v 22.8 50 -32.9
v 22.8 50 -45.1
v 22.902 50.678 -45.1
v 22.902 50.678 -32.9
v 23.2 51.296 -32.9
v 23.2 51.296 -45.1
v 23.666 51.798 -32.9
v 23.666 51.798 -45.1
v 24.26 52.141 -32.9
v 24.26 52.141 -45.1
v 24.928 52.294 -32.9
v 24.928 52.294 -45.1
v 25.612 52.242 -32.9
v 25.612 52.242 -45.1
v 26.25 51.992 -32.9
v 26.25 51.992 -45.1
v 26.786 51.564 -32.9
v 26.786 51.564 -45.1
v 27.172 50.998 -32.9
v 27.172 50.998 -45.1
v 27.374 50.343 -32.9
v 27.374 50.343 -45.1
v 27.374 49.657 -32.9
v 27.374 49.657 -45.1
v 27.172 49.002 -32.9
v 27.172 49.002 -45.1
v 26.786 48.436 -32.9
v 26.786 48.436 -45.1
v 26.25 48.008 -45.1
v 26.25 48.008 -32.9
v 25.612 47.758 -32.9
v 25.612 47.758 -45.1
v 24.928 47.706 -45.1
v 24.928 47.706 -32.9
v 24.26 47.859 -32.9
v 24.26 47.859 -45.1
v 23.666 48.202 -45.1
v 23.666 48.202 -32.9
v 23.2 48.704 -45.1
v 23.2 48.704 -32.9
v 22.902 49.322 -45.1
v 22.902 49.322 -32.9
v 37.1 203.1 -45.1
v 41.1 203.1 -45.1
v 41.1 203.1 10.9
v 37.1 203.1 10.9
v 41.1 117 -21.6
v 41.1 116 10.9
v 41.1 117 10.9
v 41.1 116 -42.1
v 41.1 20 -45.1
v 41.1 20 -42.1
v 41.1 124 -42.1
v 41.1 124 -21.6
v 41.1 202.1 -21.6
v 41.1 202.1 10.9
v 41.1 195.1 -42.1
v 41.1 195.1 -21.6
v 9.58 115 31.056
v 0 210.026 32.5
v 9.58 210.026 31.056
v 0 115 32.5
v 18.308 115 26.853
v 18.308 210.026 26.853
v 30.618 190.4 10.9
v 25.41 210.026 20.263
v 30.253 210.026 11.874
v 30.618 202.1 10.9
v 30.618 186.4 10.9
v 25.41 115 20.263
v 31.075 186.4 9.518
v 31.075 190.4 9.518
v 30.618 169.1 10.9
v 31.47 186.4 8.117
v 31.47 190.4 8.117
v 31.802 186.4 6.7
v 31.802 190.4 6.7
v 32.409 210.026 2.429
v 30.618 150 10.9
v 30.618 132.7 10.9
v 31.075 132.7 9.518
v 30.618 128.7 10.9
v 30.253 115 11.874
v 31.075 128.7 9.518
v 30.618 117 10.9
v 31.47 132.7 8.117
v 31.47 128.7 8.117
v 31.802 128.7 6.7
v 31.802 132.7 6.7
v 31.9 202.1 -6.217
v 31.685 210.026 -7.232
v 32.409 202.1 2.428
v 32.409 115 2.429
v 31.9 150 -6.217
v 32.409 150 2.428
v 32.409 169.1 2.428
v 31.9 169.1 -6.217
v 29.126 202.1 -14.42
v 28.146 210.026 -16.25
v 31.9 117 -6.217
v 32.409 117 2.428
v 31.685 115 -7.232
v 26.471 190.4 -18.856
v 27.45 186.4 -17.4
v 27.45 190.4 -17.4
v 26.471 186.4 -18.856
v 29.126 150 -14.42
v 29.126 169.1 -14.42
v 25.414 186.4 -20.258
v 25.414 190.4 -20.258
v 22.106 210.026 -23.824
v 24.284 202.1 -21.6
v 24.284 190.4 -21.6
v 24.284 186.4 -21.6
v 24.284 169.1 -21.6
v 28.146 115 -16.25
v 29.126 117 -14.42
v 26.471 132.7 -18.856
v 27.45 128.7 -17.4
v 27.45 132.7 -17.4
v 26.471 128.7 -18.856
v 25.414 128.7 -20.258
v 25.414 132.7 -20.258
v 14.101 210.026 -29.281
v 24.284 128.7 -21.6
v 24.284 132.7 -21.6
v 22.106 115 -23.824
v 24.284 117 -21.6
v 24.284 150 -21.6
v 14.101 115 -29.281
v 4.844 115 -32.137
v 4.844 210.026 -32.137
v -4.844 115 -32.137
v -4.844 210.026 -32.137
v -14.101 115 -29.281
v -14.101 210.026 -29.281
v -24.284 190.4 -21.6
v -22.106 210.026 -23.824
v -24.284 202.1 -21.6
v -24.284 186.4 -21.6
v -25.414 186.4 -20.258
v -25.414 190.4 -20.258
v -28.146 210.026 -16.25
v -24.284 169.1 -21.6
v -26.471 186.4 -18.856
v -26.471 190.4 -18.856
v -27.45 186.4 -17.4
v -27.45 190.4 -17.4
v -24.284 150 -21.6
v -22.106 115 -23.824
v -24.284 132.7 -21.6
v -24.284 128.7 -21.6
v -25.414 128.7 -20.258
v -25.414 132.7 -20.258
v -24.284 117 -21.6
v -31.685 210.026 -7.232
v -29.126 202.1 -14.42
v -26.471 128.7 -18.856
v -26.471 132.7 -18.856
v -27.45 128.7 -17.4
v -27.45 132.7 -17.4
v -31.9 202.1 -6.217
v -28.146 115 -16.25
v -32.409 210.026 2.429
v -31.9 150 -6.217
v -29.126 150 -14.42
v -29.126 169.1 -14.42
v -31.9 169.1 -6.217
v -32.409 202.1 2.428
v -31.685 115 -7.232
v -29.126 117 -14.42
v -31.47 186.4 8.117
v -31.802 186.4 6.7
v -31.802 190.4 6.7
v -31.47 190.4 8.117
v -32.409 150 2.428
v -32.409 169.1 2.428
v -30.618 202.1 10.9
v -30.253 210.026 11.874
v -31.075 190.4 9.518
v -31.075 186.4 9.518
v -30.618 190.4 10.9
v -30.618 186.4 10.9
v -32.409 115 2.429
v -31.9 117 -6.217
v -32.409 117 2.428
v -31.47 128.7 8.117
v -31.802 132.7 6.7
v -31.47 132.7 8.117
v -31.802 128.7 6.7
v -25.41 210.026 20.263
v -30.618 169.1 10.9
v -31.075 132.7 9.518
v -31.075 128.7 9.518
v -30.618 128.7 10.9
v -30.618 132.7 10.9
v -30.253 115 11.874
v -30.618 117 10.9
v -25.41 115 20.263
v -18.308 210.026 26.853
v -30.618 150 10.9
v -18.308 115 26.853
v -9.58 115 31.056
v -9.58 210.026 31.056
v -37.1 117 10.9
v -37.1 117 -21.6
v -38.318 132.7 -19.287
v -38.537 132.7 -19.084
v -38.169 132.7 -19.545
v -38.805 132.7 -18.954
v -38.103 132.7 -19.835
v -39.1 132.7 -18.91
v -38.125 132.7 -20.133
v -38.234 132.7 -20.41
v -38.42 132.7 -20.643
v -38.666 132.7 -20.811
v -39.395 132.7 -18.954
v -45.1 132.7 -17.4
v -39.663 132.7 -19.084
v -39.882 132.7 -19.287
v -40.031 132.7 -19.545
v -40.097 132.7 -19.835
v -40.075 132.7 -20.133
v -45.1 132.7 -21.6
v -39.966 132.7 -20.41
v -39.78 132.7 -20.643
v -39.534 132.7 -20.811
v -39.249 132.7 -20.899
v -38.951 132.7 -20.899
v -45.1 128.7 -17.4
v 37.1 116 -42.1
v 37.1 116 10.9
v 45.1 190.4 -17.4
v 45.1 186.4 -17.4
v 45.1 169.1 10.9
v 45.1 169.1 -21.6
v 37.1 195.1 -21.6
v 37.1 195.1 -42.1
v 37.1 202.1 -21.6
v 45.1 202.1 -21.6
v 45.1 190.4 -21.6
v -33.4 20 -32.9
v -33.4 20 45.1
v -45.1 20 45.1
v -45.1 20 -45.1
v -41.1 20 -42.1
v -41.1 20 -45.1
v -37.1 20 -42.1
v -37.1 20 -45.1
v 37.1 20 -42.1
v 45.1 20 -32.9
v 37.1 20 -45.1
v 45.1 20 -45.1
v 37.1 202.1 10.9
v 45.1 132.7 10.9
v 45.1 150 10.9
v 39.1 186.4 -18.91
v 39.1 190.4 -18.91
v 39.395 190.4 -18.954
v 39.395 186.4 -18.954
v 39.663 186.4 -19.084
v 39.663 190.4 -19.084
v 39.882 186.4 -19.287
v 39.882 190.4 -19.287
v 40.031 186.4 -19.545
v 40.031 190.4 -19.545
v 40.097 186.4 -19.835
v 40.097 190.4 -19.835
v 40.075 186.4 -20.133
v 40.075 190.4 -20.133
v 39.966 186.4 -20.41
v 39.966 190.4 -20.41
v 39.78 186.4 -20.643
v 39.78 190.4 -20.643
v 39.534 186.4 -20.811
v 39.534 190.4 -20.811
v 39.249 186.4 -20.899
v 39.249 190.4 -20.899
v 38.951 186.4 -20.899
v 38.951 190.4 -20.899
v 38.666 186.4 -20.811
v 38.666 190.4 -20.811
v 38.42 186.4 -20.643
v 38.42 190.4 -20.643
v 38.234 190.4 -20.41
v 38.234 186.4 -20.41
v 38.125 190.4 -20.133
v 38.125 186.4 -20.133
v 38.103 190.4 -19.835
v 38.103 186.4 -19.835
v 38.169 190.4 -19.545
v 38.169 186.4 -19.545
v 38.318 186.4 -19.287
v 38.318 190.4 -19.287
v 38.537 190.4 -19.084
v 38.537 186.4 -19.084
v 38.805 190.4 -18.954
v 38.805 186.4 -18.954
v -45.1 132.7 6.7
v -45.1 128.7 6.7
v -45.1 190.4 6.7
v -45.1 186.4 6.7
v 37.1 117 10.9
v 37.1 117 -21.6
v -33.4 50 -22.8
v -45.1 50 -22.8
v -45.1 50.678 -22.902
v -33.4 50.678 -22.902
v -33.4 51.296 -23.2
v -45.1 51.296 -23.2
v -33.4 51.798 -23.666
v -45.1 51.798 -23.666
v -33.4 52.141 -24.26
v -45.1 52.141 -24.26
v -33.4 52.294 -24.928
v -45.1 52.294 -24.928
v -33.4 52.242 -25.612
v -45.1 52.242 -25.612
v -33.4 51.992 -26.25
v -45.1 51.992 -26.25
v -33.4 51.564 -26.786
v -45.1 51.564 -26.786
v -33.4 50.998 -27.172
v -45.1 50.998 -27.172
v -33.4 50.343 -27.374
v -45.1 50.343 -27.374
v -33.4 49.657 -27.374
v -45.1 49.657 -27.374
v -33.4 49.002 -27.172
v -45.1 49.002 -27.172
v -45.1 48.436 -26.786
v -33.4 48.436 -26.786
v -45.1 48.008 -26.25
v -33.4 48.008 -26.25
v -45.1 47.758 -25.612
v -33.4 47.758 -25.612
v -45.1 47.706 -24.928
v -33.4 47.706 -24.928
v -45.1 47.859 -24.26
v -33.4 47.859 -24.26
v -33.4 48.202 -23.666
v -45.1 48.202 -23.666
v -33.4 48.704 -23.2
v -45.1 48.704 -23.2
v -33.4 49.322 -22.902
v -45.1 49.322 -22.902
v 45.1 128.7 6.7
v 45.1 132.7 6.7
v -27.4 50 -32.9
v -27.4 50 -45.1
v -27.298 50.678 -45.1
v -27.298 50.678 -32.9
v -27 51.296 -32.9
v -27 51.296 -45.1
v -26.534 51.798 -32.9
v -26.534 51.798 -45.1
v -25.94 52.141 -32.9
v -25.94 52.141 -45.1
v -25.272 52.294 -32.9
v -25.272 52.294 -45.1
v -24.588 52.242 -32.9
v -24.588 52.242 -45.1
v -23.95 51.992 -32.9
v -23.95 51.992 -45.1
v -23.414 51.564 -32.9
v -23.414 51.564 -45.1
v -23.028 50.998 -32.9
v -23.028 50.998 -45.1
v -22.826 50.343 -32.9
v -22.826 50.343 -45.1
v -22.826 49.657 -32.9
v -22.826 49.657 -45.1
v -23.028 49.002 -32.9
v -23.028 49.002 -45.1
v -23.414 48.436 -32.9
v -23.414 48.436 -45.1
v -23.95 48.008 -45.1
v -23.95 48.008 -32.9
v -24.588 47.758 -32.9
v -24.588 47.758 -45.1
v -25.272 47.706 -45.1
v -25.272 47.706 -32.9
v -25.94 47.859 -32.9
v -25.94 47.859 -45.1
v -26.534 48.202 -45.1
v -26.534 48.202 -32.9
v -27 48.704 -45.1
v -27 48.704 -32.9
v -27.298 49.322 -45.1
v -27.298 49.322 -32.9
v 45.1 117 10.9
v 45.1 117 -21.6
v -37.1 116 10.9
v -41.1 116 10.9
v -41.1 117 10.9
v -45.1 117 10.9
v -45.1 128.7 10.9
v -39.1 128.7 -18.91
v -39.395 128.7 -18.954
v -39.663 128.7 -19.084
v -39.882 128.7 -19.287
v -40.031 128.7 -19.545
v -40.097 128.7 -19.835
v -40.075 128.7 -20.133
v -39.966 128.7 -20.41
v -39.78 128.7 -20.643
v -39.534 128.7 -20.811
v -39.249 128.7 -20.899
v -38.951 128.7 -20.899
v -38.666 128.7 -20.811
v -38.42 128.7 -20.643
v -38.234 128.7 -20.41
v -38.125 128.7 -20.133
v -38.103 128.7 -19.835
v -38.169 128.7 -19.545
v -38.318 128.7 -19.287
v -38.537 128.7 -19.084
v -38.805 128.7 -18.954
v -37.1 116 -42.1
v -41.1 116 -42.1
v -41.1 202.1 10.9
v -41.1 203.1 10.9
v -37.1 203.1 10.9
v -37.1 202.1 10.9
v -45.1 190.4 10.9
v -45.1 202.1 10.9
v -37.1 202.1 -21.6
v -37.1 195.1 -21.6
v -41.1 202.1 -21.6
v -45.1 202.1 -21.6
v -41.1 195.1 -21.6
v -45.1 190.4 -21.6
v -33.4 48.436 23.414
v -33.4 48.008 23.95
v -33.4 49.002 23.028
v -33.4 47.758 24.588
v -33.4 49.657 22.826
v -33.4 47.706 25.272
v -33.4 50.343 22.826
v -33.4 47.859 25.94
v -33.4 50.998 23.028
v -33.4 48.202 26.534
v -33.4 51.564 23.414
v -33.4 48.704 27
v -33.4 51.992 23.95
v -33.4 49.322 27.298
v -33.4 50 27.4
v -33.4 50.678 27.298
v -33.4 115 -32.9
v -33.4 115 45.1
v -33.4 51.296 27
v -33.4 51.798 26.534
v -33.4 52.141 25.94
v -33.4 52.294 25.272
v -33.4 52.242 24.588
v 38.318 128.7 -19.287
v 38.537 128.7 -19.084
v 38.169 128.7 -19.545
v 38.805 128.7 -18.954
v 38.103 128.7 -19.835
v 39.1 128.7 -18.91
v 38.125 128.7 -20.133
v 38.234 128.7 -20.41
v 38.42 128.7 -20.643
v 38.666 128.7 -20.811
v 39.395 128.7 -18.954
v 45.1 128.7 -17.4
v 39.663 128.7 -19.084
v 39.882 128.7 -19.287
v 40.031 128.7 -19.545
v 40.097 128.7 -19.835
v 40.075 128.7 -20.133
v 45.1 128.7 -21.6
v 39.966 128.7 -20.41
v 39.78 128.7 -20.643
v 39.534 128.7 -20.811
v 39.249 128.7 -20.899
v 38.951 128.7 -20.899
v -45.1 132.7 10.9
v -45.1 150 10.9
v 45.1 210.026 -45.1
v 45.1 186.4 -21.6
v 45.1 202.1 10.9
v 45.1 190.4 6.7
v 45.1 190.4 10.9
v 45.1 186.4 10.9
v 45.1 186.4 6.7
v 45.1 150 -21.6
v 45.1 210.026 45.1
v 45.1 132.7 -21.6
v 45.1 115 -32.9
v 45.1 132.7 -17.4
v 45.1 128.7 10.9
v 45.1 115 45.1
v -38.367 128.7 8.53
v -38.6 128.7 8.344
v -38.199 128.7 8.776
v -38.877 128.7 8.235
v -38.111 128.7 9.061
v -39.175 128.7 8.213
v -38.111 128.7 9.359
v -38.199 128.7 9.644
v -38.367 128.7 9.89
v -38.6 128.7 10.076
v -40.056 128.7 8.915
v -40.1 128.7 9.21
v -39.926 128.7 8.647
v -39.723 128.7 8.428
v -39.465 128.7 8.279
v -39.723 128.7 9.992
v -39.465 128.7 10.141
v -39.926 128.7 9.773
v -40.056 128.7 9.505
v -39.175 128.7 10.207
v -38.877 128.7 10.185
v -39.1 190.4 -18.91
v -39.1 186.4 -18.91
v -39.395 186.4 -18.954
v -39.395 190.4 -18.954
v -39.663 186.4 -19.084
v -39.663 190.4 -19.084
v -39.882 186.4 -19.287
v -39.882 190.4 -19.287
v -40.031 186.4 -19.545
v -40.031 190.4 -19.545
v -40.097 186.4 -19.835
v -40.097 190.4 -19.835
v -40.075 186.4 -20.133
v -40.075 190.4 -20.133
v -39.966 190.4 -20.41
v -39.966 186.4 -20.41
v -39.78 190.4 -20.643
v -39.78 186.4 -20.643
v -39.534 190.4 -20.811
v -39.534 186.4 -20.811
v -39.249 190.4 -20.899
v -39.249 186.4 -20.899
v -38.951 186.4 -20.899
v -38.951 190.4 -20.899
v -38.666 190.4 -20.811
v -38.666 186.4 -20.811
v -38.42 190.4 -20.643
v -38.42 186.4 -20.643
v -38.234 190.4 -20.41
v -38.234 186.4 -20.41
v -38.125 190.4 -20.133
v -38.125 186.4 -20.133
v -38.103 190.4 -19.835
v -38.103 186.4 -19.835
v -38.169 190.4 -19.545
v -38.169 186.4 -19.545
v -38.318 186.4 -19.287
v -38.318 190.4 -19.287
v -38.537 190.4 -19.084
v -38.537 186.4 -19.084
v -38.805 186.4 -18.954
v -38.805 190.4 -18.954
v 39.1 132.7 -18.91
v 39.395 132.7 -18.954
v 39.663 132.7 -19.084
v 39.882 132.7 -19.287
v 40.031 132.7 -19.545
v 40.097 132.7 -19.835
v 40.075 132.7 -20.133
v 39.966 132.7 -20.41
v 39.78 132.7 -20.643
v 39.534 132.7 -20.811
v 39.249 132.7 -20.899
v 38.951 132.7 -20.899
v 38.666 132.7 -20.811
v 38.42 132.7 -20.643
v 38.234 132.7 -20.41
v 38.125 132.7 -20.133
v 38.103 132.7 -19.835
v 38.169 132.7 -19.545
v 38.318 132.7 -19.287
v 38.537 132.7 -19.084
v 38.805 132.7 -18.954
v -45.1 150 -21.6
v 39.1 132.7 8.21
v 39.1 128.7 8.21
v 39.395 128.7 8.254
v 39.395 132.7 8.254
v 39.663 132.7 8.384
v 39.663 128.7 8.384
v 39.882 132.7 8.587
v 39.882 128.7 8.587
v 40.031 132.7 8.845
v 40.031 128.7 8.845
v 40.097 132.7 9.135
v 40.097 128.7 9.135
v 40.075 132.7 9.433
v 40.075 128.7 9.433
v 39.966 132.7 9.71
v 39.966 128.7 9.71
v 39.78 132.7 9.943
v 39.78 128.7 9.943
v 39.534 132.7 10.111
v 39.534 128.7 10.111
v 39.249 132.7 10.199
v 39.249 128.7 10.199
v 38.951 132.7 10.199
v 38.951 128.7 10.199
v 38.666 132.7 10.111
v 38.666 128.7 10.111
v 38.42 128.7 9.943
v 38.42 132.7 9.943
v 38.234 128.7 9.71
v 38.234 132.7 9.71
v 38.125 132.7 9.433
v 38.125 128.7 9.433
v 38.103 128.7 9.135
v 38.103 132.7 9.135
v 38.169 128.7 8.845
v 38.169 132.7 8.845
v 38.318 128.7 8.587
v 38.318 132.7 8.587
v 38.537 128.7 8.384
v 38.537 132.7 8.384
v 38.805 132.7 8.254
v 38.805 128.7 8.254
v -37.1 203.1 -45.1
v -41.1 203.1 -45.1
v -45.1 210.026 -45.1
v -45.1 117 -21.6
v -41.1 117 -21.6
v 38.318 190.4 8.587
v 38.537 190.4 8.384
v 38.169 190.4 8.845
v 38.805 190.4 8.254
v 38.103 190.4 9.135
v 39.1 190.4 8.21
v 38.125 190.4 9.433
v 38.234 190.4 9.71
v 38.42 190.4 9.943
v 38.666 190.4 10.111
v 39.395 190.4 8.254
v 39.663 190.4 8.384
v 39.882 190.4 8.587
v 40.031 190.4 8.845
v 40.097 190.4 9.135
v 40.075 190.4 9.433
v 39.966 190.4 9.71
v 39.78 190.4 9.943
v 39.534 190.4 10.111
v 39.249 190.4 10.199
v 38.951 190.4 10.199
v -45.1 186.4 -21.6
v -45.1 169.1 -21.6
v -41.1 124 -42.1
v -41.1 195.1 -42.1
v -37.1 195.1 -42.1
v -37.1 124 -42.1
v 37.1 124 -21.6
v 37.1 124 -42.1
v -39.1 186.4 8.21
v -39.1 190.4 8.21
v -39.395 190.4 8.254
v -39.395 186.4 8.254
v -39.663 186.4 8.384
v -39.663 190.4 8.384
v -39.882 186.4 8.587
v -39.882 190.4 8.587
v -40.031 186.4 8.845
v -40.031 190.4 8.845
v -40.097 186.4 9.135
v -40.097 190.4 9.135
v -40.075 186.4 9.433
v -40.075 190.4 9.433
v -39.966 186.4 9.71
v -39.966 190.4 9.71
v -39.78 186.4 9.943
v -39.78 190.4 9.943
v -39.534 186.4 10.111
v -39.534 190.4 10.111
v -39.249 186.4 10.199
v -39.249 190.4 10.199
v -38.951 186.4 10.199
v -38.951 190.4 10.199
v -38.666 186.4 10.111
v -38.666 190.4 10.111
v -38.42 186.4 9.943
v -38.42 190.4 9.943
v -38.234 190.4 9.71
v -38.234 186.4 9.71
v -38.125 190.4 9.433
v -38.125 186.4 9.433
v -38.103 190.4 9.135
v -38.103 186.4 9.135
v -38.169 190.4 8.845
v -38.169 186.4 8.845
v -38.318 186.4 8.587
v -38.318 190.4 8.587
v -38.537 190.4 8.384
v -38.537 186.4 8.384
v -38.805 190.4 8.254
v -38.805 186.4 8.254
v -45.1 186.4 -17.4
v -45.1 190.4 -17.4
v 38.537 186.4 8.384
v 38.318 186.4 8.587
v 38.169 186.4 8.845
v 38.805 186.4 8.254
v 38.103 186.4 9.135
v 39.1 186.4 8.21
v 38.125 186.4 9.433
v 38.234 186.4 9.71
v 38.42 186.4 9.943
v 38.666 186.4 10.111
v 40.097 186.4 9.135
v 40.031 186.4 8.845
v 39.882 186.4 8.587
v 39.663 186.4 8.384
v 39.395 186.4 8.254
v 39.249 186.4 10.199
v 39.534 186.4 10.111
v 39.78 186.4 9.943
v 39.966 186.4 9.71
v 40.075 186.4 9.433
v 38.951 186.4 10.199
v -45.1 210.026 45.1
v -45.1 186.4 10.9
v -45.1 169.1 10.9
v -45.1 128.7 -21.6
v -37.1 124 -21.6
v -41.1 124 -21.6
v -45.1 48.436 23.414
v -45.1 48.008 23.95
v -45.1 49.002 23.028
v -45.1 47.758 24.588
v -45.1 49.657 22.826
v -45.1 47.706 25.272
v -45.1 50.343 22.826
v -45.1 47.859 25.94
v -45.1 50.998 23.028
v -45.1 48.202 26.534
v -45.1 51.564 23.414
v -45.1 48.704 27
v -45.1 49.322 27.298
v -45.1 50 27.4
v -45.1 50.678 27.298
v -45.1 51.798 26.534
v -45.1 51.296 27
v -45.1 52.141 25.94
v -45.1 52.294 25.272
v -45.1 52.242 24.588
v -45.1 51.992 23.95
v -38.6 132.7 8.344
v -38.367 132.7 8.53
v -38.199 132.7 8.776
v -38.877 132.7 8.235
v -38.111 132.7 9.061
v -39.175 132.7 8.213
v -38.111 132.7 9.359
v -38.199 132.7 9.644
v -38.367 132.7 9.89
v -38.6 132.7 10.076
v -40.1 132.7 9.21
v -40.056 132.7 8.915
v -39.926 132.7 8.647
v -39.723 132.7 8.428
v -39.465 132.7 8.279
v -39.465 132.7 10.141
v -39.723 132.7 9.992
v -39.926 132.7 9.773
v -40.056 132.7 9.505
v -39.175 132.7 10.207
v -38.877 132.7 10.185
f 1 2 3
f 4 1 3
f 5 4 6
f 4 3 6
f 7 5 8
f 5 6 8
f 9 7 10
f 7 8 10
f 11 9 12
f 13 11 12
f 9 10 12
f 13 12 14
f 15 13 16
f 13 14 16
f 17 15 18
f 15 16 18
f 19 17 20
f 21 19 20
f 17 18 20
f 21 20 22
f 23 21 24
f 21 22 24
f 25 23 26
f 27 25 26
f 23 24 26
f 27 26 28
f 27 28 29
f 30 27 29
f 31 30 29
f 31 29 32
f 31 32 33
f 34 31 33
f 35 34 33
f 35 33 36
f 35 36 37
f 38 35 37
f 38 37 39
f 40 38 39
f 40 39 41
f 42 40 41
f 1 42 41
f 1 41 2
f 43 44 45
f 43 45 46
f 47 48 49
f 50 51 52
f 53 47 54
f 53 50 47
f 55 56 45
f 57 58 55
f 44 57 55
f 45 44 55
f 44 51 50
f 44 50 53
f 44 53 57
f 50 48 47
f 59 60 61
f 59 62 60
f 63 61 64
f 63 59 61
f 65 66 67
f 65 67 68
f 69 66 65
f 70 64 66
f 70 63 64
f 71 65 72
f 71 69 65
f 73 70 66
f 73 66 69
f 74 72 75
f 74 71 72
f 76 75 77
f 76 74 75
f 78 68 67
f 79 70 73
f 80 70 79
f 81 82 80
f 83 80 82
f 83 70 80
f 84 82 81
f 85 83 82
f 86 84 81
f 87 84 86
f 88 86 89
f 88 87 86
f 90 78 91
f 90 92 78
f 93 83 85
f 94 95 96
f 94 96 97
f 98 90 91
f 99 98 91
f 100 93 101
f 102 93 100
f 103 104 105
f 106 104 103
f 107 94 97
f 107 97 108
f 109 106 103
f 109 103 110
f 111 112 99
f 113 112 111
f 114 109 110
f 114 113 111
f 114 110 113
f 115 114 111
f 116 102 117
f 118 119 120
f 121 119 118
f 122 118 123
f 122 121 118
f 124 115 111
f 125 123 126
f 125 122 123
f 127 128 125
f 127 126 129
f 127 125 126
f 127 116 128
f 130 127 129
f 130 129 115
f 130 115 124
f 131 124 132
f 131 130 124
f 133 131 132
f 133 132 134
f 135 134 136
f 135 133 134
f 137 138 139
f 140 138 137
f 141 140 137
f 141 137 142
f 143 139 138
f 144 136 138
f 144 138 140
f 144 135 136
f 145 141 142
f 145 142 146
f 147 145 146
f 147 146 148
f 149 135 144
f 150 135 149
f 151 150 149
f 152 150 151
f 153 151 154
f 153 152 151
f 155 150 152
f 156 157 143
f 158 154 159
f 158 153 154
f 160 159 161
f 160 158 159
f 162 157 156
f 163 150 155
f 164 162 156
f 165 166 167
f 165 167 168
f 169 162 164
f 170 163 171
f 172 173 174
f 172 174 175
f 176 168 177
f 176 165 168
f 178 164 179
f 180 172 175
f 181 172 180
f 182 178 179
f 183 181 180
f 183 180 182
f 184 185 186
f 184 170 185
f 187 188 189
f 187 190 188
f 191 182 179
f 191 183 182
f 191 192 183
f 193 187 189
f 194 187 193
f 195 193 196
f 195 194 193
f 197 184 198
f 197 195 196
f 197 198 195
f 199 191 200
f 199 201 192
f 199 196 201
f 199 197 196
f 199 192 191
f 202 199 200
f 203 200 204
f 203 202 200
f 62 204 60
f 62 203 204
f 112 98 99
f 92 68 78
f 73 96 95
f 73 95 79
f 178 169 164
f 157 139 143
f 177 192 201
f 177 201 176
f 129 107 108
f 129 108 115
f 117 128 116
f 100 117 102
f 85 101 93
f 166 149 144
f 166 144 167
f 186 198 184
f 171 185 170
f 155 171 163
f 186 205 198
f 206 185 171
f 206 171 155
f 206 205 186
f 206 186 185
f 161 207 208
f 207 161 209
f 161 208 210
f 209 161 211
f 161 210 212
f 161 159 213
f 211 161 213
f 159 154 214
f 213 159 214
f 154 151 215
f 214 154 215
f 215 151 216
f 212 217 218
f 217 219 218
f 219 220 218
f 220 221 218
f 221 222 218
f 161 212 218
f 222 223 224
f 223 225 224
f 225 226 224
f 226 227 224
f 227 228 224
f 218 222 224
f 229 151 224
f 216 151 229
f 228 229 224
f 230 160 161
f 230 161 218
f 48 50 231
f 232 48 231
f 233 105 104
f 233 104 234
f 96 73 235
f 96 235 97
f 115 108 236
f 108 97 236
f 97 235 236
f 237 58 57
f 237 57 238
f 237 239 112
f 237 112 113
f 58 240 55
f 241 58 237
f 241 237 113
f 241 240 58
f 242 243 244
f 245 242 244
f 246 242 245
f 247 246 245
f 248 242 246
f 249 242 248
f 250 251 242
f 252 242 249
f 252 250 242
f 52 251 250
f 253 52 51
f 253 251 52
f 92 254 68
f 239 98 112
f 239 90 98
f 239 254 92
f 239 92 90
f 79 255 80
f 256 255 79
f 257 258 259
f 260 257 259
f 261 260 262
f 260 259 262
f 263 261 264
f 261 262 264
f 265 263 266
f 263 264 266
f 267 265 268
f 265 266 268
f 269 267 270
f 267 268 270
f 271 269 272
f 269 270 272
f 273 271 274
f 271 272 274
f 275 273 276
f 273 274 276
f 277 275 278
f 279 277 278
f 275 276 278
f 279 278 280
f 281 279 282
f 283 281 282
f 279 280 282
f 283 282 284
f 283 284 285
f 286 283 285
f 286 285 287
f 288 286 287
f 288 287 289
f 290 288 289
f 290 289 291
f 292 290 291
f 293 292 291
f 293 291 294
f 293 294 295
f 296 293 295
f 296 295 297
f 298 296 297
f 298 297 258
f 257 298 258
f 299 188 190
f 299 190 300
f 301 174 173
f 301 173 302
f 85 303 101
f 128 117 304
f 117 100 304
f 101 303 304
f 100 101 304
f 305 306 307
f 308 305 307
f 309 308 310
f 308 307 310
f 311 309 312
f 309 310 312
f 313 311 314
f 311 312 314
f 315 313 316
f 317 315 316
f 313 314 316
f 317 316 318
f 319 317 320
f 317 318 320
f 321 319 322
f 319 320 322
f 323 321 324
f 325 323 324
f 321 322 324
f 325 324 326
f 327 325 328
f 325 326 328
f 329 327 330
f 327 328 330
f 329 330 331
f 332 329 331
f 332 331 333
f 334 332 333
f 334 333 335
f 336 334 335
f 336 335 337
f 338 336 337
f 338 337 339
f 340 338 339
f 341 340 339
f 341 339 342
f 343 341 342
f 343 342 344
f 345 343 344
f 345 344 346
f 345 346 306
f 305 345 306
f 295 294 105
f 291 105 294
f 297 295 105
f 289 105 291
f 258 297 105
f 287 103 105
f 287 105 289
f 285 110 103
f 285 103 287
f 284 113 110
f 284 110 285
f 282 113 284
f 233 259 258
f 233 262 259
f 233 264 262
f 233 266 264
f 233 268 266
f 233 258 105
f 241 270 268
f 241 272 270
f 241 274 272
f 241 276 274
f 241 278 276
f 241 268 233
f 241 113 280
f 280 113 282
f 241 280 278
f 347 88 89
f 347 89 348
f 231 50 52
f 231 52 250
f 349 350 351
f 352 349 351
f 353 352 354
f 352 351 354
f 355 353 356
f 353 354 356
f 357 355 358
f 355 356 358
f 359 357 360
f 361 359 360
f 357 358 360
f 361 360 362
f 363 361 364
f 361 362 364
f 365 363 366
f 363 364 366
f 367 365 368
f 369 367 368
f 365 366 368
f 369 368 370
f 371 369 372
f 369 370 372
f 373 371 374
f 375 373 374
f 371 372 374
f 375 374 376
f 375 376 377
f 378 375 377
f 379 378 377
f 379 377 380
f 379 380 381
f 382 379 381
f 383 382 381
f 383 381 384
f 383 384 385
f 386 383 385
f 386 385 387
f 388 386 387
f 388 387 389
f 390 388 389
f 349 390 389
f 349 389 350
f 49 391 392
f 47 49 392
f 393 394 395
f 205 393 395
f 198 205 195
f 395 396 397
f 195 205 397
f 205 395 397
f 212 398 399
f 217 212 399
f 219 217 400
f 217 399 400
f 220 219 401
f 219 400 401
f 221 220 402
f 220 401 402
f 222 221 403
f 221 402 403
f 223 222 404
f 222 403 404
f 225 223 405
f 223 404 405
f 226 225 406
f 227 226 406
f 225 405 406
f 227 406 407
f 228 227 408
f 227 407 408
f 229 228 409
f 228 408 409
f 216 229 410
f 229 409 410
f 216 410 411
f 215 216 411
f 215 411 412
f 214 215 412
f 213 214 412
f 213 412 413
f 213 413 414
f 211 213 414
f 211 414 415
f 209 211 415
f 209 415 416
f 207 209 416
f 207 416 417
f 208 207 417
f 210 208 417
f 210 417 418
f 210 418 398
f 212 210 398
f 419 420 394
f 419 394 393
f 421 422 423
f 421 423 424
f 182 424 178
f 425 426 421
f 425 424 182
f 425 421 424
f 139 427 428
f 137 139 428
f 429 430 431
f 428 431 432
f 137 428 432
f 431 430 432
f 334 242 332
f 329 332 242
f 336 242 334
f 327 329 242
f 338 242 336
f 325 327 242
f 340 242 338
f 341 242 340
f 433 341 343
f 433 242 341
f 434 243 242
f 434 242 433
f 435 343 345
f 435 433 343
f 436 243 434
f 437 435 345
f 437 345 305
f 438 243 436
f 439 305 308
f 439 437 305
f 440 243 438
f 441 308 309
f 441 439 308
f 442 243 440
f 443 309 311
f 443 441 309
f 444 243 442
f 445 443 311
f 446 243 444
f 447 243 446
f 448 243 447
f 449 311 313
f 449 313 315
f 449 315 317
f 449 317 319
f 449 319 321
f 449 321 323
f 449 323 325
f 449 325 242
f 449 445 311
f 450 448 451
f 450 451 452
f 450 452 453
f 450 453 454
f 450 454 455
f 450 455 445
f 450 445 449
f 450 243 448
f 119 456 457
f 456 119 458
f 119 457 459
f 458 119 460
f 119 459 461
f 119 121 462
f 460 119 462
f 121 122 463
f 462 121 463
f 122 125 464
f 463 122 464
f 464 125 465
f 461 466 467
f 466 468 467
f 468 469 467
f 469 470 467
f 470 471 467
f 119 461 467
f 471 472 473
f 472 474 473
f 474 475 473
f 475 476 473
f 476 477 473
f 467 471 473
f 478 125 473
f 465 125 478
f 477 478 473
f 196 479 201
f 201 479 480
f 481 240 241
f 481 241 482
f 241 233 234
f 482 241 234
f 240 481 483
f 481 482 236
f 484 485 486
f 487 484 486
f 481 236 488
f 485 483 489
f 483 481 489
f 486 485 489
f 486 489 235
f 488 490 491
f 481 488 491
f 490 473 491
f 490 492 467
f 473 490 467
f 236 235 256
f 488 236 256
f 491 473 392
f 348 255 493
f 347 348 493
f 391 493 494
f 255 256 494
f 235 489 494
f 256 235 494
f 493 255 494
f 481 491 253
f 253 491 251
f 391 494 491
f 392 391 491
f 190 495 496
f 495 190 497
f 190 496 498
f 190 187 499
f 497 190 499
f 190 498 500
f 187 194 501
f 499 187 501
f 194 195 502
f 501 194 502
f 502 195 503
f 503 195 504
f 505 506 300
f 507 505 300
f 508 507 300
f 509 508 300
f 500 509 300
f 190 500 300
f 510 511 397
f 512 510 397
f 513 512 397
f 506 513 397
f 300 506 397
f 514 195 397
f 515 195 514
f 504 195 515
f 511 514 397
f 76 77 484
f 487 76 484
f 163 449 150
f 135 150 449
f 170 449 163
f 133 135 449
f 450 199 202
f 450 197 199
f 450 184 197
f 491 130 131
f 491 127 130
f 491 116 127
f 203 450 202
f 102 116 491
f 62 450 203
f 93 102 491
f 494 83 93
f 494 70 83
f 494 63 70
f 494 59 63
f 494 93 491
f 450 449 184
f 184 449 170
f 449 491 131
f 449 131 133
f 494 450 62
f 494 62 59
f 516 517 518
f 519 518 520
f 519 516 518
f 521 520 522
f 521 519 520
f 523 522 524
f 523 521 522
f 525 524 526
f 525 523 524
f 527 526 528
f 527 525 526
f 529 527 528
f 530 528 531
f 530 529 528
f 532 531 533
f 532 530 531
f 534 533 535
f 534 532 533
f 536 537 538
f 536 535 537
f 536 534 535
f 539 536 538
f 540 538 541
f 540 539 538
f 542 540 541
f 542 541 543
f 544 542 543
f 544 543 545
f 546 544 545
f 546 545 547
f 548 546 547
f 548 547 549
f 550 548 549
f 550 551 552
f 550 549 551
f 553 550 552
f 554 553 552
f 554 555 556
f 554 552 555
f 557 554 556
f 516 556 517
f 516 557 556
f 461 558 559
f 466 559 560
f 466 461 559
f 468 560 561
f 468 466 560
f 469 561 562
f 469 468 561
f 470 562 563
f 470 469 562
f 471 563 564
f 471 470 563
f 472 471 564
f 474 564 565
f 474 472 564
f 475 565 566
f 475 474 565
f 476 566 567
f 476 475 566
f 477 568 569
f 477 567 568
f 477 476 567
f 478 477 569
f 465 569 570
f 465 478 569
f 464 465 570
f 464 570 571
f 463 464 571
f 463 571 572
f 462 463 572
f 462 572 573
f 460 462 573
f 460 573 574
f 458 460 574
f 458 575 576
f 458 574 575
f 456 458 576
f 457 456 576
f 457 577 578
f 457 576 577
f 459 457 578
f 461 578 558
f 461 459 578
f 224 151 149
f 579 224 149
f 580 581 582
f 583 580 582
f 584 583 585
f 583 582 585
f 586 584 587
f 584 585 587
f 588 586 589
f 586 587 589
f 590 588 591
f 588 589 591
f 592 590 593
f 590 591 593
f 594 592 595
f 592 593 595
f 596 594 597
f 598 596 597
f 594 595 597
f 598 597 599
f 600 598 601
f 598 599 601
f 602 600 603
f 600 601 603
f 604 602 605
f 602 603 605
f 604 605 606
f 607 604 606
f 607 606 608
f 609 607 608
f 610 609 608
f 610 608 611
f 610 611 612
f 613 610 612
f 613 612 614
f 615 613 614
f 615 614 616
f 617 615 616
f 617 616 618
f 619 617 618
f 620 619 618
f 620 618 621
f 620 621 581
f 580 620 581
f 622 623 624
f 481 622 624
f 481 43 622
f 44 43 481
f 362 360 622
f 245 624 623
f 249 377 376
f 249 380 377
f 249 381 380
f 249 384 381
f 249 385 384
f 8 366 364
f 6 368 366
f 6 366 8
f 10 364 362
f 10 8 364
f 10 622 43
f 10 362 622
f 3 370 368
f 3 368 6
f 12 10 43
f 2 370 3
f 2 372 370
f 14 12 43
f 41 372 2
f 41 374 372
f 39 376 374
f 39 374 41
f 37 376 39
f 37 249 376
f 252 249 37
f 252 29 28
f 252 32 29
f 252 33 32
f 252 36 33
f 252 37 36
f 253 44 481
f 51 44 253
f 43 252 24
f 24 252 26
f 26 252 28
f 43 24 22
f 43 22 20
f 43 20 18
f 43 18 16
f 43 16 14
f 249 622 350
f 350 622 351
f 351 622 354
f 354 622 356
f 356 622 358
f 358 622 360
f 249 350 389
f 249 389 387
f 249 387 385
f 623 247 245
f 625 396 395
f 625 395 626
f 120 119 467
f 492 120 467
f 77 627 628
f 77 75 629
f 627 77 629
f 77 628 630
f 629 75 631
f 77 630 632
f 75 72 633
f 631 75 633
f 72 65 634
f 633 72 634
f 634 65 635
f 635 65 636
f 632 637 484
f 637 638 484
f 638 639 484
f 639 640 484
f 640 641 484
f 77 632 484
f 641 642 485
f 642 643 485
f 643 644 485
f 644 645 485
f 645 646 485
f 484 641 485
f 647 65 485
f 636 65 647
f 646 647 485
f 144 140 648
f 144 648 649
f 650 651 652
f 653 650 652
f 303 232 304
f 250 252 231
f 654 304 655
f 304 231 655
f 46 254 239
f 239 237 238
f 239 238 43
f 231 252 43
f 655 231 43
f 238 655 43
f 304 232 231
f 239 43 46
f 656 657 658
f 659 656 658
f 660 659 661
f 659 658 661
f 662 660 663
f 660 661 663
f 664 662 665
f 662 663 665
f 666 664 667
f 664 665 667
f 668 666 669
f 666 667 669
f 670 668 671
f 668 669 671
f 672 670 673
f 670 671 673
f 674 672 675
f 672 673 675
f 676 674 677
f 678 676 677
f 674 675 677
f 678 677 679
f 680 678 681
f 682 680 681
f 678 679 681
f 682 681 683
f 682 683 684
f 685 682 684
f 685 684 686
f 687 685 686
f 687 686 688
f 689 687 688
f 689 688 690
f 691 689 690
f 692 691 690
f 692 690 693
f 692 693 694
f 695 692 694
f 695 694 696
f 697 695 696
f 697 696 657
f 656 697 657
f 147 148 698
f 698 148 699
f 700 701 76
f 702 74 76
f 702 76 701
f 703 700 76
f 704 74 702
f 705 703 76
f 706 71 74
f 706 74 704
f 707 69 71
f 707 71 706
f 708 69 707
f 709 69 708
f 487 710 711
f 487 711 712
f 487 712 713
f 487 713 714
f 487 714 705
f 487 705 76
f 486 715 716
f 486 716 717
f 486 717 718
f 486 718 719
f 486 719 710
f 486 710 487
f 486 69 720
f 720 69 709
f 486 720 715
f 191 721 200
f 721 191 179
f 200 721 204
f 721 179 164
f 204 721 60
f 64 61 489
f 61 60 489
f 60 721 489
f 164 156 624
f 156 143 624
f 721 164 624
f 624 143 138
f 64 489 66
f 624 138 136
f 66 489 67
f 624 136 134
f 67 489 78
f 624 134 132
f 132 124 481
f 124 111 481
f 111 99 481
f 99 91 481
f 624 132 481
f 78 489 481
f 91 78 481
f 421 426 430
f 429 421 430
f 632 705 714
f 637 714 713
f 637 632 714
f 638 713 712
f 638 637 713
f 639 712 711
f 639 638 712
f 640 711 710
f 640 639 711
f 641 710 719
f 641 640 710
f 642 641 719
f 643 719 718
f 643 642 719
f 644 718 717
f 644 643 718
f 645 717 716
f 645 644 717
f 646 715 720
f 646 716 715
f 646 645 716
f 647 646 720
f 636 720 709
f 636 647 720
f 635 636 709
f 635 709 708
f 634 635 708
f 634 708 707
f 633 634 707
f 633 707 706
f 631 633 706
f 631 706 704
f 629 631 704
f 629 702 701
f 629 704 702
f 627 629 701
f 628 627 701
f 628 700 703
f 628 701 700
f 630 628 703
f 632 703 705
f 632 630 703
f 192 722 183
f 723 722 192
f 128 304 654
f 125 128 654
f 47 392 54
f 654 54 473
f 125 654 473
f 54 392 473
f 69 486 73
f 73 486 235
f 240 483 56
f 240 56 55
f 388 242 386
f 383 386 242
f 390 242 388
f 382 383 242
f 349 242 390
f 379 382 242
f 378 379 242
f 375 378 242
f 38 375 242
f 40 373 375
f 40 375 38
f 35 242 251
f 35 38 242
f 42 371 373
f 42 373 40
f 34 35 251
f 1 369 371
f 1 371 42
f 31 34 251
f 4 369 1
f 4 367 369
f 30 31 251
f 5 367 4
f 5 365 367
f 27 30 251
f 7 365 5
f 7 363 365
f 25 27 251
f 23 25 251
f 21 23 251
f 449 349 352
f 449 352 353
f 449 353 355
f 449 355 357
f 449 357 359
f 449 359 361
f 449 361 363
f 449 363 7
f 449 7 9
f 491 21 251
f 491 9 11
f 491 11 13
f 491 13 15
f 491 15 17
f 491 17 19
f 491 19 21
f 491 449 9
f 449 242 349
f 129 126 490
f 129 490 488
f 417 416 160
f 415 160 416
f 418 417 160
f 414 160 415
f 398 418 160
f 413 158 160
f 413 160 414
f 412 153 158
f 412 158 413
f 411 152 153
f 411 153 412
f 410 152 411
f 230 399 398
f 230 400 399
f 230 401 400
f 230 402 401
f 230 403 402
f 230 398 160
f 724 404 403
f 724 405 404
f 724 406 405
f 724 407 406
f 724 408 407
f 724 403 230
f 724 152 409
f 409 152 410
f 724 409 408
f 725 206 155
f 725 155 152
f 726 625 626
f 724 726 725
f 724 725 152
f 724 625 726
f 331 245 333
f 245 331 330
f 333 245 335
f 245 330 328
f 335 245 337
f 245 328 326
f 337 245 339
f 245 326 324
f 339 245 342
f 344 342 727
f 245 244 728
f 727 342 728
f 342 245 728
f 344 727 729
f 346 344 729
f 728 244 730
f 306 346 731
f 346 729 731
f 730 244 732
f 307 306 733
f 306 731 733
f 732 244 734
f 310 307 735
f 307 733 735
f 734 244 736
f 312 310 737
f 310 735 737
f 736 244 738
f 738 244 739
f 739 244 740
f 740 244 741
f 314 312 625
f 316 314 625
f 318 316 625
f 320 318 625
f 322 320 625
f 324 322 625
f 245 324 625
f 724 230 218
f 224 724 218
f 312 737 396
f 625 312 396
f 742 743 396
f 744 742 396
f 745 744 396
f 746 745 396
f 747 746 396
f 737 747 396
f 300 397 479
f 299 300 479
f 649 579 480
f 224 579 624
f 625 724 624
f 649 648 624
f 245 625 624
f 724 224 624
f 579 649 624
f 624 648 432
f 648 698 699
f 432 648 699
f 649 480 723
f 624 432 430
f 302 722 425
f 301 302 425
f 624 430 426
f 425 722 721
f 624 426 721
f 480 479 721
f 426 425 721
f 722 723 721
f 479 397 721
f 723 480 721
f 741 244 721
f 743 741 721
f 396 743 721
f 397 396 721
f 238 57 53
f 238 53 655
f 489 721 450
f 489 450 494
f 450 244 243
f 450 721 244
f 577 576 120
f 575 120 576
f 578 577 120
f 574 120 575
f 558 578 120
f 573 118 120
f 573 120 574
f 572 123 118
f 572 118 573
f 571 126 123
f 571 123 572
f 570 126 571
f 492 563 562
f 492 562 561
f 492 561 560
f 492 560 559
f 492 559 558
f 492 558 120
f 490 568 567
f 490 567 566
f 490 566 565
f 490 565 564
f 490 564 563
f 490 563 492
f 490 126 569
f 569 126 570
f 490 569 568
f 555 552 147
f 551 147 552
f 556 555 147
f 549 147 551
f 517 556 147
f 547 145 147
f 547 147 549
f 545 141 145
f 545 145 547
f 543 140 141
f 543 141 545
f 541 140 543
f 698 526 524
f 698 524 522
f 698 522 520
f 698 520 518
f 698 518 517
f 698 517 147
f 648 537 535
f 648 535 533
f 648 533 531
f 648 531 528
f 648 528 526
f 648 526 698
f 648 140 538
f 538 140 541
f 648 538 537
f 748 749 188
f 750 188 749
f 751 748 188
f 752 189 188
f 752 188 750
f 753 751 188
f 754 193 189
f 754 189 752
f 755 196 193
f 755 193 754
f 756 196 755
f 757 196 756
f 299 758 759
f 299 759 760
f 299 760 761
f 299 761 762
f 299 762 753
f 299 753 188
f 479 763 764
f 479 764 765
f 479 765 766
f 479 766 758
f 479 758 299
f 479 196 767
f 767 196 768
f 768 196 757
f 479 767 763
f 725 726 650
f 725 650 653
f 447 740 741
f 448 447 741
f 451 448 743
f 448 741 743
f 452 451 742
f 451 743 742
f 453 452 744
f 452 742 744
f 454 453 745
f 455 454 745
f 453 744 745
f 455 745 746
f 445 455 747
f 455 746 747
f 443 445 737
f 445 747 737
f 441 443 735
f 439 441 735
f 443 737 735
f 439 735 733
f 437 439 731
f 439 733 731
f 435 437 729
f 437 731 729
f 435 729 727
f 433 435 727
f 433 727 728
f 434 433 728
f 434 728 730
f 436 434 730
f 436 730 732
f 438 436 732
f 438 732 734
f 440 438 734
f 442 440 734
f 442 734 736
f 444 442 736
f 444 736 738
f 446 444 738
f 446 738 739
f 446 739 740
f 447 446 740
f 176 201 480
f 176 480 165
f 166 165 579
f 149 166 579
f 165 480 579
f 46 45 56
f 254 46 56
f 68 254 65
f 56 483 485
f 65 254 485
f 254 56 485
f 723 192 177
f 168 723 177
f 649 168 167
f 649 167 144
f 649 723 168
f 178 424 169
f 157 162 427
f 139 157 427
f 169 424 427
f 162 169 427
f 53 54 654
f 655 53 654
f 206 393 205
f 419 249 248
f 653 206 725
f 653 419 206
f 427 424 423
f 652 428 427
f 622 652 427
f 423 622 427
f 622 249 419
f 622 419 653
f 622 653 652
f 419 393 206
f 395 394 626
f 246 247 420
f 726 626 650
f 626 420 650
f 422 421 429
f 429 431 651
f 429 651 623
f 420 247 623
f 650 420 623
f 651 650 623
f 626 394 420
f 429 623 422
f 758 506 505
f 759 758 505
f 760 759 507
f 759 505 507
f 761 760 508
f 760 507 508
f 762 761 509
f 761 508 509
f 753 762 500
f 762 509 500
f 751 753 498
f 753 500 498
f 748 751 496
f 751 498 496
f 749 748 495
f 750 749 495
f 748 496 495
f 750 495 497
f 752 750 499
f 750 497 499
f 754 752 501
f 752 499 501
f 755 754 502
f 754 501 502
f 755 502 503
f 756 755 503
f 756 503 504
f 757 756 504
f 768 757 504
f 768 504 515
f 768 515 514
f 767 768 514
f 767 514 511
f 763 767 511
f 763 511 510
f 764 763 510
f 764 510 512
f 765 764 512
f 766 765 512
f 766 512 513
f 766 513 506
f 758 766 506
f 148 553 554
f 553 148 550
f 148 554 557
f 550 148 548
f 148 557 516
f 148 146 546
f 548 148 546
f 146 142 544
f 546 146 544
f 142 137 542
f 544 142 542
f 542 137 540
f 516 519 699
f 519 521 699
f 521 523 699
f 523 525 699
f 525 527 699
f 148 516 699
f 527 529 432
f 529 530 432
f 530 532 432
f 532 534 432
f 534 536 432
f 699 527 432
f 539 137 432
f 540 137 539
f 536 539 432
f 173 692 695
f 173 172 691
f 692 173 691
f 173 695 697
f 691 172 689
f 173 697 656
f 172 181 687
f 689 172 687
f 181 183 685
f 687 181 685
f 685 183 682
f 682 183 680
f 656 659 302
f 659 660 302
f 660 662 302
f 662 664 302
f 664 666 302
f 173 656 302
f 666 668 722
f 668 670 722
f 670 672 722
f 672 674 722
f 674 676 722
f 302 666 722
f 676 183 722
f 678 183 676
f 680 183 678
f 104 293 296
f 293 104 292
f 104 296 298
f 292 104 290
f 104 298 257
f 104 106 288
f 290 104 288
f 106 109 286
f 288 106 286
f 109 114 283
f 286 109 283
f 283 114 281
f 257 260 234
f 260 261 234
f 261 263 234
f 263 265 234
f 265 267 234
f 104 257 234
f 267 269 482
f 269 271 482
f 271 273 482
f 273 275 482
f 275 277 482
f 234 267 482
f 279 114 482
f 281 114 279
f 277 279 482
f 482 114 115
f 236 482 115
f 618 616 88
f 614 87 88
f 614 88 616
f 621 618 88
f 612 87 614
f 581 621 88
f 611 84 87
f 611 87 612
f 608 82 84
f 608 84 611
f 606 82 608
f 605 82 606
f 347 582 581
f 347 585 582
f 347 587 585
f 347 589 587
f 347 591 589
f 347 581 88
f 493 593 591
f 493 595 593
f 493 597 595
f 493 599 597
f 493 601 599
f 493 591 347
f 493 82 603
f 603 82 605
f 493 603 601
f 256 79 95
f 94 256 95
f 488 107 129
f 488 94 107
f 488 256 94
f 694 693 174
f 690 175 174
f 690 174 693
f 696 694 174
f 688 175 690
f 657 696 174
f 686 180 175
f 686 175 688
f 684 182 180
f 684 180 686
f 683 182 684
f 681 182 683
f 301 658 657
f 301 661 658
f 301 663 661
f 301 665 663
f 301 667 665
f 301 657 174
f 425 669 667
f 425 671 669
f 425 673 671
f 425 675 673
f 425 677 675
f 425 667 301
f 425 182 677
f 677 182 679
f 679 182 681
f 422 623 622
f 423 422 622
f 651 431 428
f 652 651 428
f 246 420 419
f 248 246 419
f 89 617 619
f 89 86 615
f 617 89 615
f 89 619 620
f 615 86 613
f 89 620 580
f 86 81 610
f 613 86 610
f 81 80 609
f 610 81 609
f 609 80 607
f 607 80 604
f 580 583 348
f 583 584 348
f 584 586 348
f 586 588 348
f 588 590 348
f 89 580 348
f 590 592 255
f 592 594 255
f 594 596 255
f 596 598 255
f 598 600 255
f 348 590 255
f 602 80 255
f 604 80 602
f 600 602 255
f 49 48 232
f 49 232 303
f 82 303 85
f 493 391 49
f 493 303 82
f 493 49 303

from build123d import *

# Parameters (mm, degrees)
SKETCH2_W                      = 90.2
SKETCH2_H                      = 90.2
SKETCH2_R                      = 32.5
BOSS_EXTRUDE2_DEPTH            = 250
SKETCH3_W                      = 78.5
SKETCH3_H                      = 115
CUT_EXTRUDE1_DEPTH             = 78
SKETCH6_W                      = 32.5
SKETCH6_H                      = 33
CUT_EXTRUDE4_DEPTH             = 32.6
MIRROR3_COPY_1_SKETCH_W        = 32.5
MIRROR3_COPY_1_SKETCH_H        = 33
MIRROR3_COPY_1_DEPTH           = 32.6
MIRROR3_COPY_2_SKETCH_W        = 32.5
MIRROR3_COPY_2_SKETCH_H        = 33
MIRROR3_COPY_2_DEPTH           = 32.6
CUT_EXTRUDE5_REACH             = 271.574
SKETCH10_W                     = 4
SKETCH10_H                     = 8
CUT_EXTRUDE5_DIRECTION_2_DEPTH = 270.573830332
SKETCH11_W                     = 4
SKETCH11_H                     = 200
CUT_EXTRUDE6_DEPTH             = 3
MIRROR7_COPY_1_REACH           = 271.574
MIRROR7_COPY_1_SKETCH_W        = 4
MIRROR7_COPY_1_SKETCH_H        = 8
MIRROR7_COPY_2_SKETCH_W        = 4
MIRROR7_COPY_2_SKETCH_H        = 8
MIRROR7_COPY_2_DEPTH           = 270.573830332
MIRROR7_COPY_3_REACH           = 271.574
MIRROR7_COPY_3_SKETCH_W        = 4
MIRROR7_COPY_3_SKETCH_H        = 8
MIRROR7_COPY_4_SKETCH_W        = 4
MIRROR7_COPY_4_SKETCH_H        = 8
MIRROR7_COPY_4_DEPTH           = 270.573830332
SKETCH12_W                     = 20.816466484
SKETCH12_H                     = 4
BOSS_EXTRUDE3_DEPTH            = 4.2
SKETCH13_R                     = 1
CUT_EXTRUDE7_DEPTH             = 10
MIRROR9_COPY_1_SKETCH_W        = 20.816466484
MIRROR9_COPY_1_SKETCH_H        = 4
MIRROR9_COPY_1_DEPTH           = 4.2
MIRROR9_COPY_2_SKETCH_R        = 1
MIRROR9_COPY_2_DEPTH           = 10
MIRROR10_COPY_1_SKETCH_W       = 20.816466484
MIRROR10_COPY_1_SKETCH_H       = 4
MIRROR10_COPY_1_DEPTH          = 4.2
MIRROR10_COPY_2_SKETCH_R       = 1
MIRROR10_COPY_2_DEPTH          = 10
MIRROR10_COPY_3_SKETCH_W       = 20.816466484
MIRROR10_COPY_3_SKETCH_H       = 4
MIRROR10_COPY_3_DEPTH          = 4.2
MIRROR10_COPY_4_SKETCH_R       = 1
MIRROR10_COPY_4_DEPTH          = 10
MIRROR10_COPY_5_SKETCH_W       = 20.816466484
MIRROR10_COPY_5_SKETCH_H       = 4
MIRROR10_COPY_5_DEPTH          = 4.2
MIRROR10_COPY_6_SKETCH_R       = 1
MIRROR10_COPY_6_DEPTH          = 10
CUT_EXTRUDE8_START             = -1000
SKETCH14_R                     = 32.5
CUT_EXTRUDE8_DEPTH             = 1000
SKETCH15_W                     = 90.2
SKETCH15_H                     = 39.974184268
CUT_EXTRUDE9_DEPTH             = 270.573830332
SKETCH16_W                     = 90.2
SKETCH16_H                     = 20
CUT_EXTRUDE10_DEPTH            = 233.982602942
SKETCH19_R                     = 2.3
CUT_EXTRUDE11_DEPTH            = 233.982602942
CIRPATTERN1_COUNT              = 2
CIRPATTERN1_ANGLE              = 90


with BuildPart() as part:
    # Sketch2 → Boss-Extrude2 (new body)
    with BuildSketch(Plane(origin=(0, 0, 0), x_dir=(1, 0, 0), z_dir=(0, 1, 0))):
        Rectangle(SKETCH2_W, SKETCH2_H)
        with Locations(Location((0, 0, 0), (0, 0, 270))):
            Circle(SKETCH2_R, mode=Mode.SUBTRACT)
    extrude(amount=BOSS_EXTRUDE2_DEPTH)

    # Sketch3 → Cut-Extrude1 (cut)
    with BuildSketch(Plane.XY.offset(45.1)):
        with Locations((5.85, 57.5)):
            Rectangle(SKETCH3_W, SKETCH3_H)
    extrude(amount=-CUT_EXTRUDE1_DEPTH, mode=Mode.SUBTRACT)

    # Sketch6 → Cut-Extrude4 (cut)
    with BuildSketch(Plane(origin=(45.1, 0, 0), x_dir=(0, 0, -1), z_dir=(1, 0, 0))):
        with Locations((5.35, 133.5)):
            Rectangle(SKETCH6_W, SKETCH6_H)
    cut_extrude4 = extrude(amount=-CUT_EXTRUDE4_DEPTH, mode=Mode.SUBTRACT)

    # Mirror1: Cut-Extrude4 across plane
    add(cut_extrude4.mirror(Plane(origin=(0, 0, 0), x_dir=(0, 0, 1), z_dir=(1, 0, 0))), mode=Mode.SUBTRACT)

    # Mirror2: Cut-Extrude4 across plane
    add(cut_extrude4.mirror(Plane(origin=(0, 159.55, 0), x_dir=(0, 0, 1), z_dir=(0, -1, 0))), mode=Mode.SUBTRACT)

    # Mirror3 copy 1 sketch → Mirror3 copy 1 (cut)
    with BuildSketch(Plane(origin=(-45.1, 319.1, 0), x_dir=(0, 0, -1), z_dir=(-1, 0, 0))):
        with Locations((5.35, 133.5)):
            Rectangle(MIRROR3_COPY_1_SKETCH_W, MIRROR3_COPY_1_SKETCH_H)
    extrude(amount=-MIRROR3_COPY_1_DEPTH, mode=Mode.SUBTRACT)

    # Mirror3 copy 2 sketch → Mirror3 copy 2 (cut)
    with BuildSketch(Plane(origin=(-45.1, 0, 0), x_dir=(0, 0, -1), z_dir=(-1, 0, 0))):
        with Locations((5.35, -133.5)):
            Rectangle(MIRROR3_COPY_2_SKETCH_W, MIRROR3_COPY_2_SKETCH_H)
    extrude(amount=-MIRROR3_COPY_2_DEPTH, mode=Mode.SUBTRACT)

    # Cut-Extrude5: up to this face of the body (flat: up to its plane)
    cut_extrude5_end = Plane(part.part.faces().sort_by_distance((37.858820987, 185.6, 10.9))[0])
    # Sketch10 → Cut-Extrude5 (cut, up to the picked face)
    with BuildSketch(Plane(origin=(0, 0, -45.1), x_dir=(-1, 0, 0), z_dir=(0, 0, -1)), mode=Mode.PRIVATE) as cut_extrude5_sk1:
        with Locations((-39.1, 199.1)):
            Rectangle(SKETCH10_W, SKETCH10_H)
    cut_extrude5_tool1 = split(extrude(cut_extrude5_sk1.sketch, amount=-CUT_EXTRUDE5_REACH, mode=Mode.PRIVATE), bisect_by=cut_extrude5_end, keep=Keep.BOTH, mode=Mode.PRIVATE)
    cut_extrude5 = cut_extrude5_tool1.solids().sort_by(Axis((39.1, 199.1, -45.1), (0, 0, 1)))[0]
    add(cut_extrude5, mode=Mode.SUBTRACT)

    # Sketch10 → Cut-Extrude5 direction 2 (cut)
    with BuildSketch(Plane(origin=(0, 0, -45.1), x_dir=(-1, 0, 0), z_dir=(0, 0, -1))):
        with Locations((-39.1, 199.1)):
            Rectangle(SKETCH10_W, SKETCH10_H)
    cut_extrude5_direction_2 = extrude(amount=CUT_EXTRUDE5_DIRECTION_2_DEPTH, mode=Mode.SUBTRACT)

    # Sketch11 → Cut-Extrude6 (cut)
    with BuildSketch(Plane(origin=(0, 0, -45.1), x_dir=(-1, 0, 0), z_dir=(0, 0, -1))):
        with Locations((-39.1, 95.1)):
            Rectangle(SKETCH11_W, SKETCH11_H)
    cut_extrude6 = extrude(amount=-CUT_EXTRUDE6_DEPTH, mode=Mode.SUBTRACT)

    # Mirror4: Cut-Extrude5, Cut-Extrude5 direction 2 across plane
    add(cut_extrude5.mirror(Plane(origin=(0, 159.55, 0), x_dir=(0, 0, 1), z_dir=(0, -1, 0))), mode=Mode.SUBTRACT)
    add(cut_extrude5_direction_2.mirror(Plane(origin=(0, 159.55, 0), x_dir=(0, 0, 1), z_dir=(0, -1, 0))), mode=Mode.SUBTRACT)

    # Mirror5: Cut-Extrude5, Cut-Extrude5 direction 2 across plane
    add(cut_extrude5.mirror(Plane(origin=(0, 0, 0), x_dir=(0, 0, 1), z_dir=(1, 0, 0))), mode=Mode.SUBTRACT)
    add(cut_extrude5_direction_2.mirror(Plane(origin=(0, 0, 0), x_dir=(0, 0, 1), z_dir=(1, 0, 0))), mode=Mode.SUBTRACT)

    # Mirror6: Cut-Extrude6 across plane
    add(cut_extrude6.mirror(Plane(origin=(0, 0, 0), x_dir=(0, 0, 1), z_dir=(1, 0, 0))), mode=Mode.SUBTRACT)

    # Mirror7 copy 1: up to this face of the body (flat: up to its plane)
    mirror7_copy_1_end = Plane(part.part.faces().sort_by_distance((-37.858820987, 133.5, 10.9))[0])
    # Mirror7 copy 1 sketch → Mirror7 copy 1 (cut, up to the picked face)
    with BuildSketch(Plane(origin=(0, 319.1, -45.1), x_dir=(1, 0, 0), z_dir=(0, 0, -1)), mode=Mode.PRIVATE) as mirror7_copy_1_sk1:
        with Locations((-39.1, 199.1)):
            Rectangle(MIRROR7_COPY_1_SKETCH_W, MIRROR7_COPY_1_SKETCH_H)
    mirror7_copy_1_tool1 = split(extrude(mirror7_copy_1_sk1.sketch, amount=-MIRROR7_COPY_1_REACH, mode=Mode.PRIVATE), bisect_by=mirror7_copy_1_end, keep=Keep.BOTH, mode=Mode.PRIVATE)
    add(mirror7_copy_1_tool1.solids().sort_by(Axis((-39.1, 120, -45.1), (0, 0, 1)))[0], mode=Mode.SUBTRACT)

    # Mirror7 copy 2 sketch → Mirror7 copy 2 (cut)
    with BuildSketch(Plane(origin=(0, 319.1, -45.1), x_dir=(1, 0, 0), z_dir=(0, 0, -1))):
        with Locations((-39.1, 199.1)):
            Rectangle(MIRROR7_COPY_2_SKETCH_W, MIRROR7_COPY_2_SKETCH_H)
    extrude(amount=MIRROR7_COPY_2_DEPTH, mode=Mode.SUBTRACT)

    # Mirror7 copy 3: up to this face of the body (flat: up to its plane)
    mirror7_copy_3_end = Plane(part.part.faces().sort_by_distance((-37.858820987, 185.6, 10.9))[0])
    # Mirror7 copy 3 sketch → Mirror7 copy 3 (cut, up to the picked face)
    with BuildSketch(Plane(origin=(0, 0, -45.1), x_dir=(1, 0, 0), z_dir=(0, 0, -1)), mode=Mode.PRIVATE) as mirror7_copy_3_sk1:
        with Locations((-39.1, -199.1)):
            Rectangle(MIRROR7_COPY_3_SKETCH_W, MIRROR7_COPY_3_SKETCH_H)
    mirror7_copy_3_tool1 = split(extrude(mirror7_copy_3_sk1.sketch, amount=-MIRROR7_COPY_3_REACH, mode=Mode.PRIVATE), bisect_by=mirror7_copy_3_end, keep=Keep.BOTH, mode=Mode.PRIVATE)
    add(mirror7_copy_3_tool1.solids().sort_by(Axis((-39.1, 199.1, -45.1), (0, 0, 1)))[0], mode=Mode.SUBTRACT)

    # Mirror7 copy 4 sketch → Mirror7 copy 4 (cut)
    with BuildSketch(Plane(origin=(0, 0, -45.1), x_dir=(1, 0, 0), z_dir=(0, 0, -1))):
        with Locations((-39.1, -199.1)):
            Rectangle(MIRROR7_COPY_4_SKETCH_W, MIRROR7_COPY_4_SKETCH_H)
    extrude(amount=MIRROR7_COPY_4_DEPTH, mode=Mode.SUBTRACT)

    # Sketch12 → Boss-Extrude3 (add)
    with BuildSketch(Plane.XY.offset(-21.6)):
        with Locations((34.691766758, 188.4)):
            Rectangle(SKETCH12_W, SKETCH12_H)
    boss_extrude3 = extrude(amount=BOSS_EXTRUDE3_DEPTH)

    # Sketch13 → Cut-Extrude7 (cut)
    with BuildSketch(Plane(origin=(0, 190.4, 0), x_dir=(1, 0, 0), z_dir=(0, 1, 0))):
        with Locations(Location((39.1, 19.91, 0), (0, 0, 270))):
            Circle(SKETCH13_R)
    cut_extrude7 = extrude(amount=-CUT_EXTRUDE7_DEPTH, mode=Mode.SUBTRACT)

    # Mirror8: Boss-Extrude3, Cut-Extrude7 across plane
    add(boss_extrude3.mirror(Plane(origin=(0, 0, -5.35), x_dir=(1, 0, 0), z_dir=(0, 0, -1))))
    add(cut_extrude7.mirror(Plane(origin=(0, 0, -5.35), x_dir=(1, 0, 0), z_dir=(0, 0, -1))), mode=Mode.SUBTRACT)

    # Mirror9: Boss-Extrude3, Cut-Extrude7 across plane
    add(boss_extrude3.mirror(Plane(origin=(0, 159.55, 0), x_dir=(0, 0, 1), z_dir=(0, -1, 0))))
    add(cut_extrude7.mirror(Plane(origin=(0, 159.55, 0), x_dir=(0, 0, 1), z_dir=(0, -1, 0))), mode=Mode.SUBTRACT)

    # Mirror9 copy 1 sketch → Mirror9 copy 1 (add)
    with BuildSketch(Plane(origin=(0, 319.1, 10.9), x_dir=(1, 0, 0), z_dir=(0, 0, -1))):
        with Locations((34.691766758, 188.4)):
            Rectangle(MIRROR9_COPY_1_SKETCH_W, MIRROR9_COPY_1_SKETCH_H)
    extrude(amount=MIRROR9_COPY_1_DEPTH)

    # Mirror9 copy 2 sketch → Mirror9 copy 2 (cut)
    with BuildSketch(Plane(origin=(0, 128.7, -10.7), x_dir=(1, 0, 0), z_dir=(0, -1, 0))):
        with Locations(Location((39.1, 19.91, 0), (0, 0, 270))):
            Circle(MIRROR9_COPY_2_SKETCH_R)
    extrude(amount=-MIRROR9_COPY_2_DEPTH, mode=Mode.SUBTRACT)

    # Mirror10: Boss-Extrude3, Cut-Extrude7 across plane
    add(boss_extrude3.mirror(Plane(origin=(0, 0, 0), x_dir=(0, 0, 1), z_dir=(1, 0, 0))))
    add(cut_extrude7.mirror(Plane(origin=(0, 0, 0), x_dir=(0, 0, 1), z_dir=(1, 0, 0))), mode=Mode.SUBTRACT)

    # Mirror10 copy 1 sketch → Mirror10 copy 1 (add)
    with BuildSketch(Plane(origin=(0, 0, 10.9), x_dir=(-1, 0, 0), z_dir=(0, 0, -1))):
        with Locations((34.691766758, 188.4)):
            Rectangle(MIRROR10_COPY_1_SKETCH_W, MIRROR10_COPY_1_SKETCH_H)
    extrude(amount=MIRROR10_COPY_1_DEPTH)

    # Mirror10 copy 2 sketch → Mirror10 copy 2 (cut)
    with BuildSketch(Plane(origin=(0, 190.4, -10.7), x_dir=(-1, 0, 0), z_dir=(0, 1, 0))):
        with Locations(Location((39.1, 19.91, 0), (0, 0, 270))):
            Circle(MIRROR10_COPY_2_SKETCH_R)
    extrude(amount=-MIRROR10_COPY_2_DEPTH, mode=Mode.SUBTRACT)

    # Mirror10 copy 3 sketch → Mirror10 copy 3 (add)
    with BuildSketch(Plane(origin=(0, 319.1, -21.6), x_dir=(-1, 0, 0), z_dir=(0, 0, 1))):
        with Locations((34.691766758, 188.4)):
            Rectangle(MIRROR10_COPY_3_SKETCH_W, MIRROR10_COPY_3_SKETCH_H)
    extrude(amount=MIRROR10_COPY_3_DEPTH)

    # Mirror10 copy 4 sketch → Mirror10 copy 4 (cut)
    with BuildSketch(Plane(origin=(0, 128.7, 0), x_dir=(-1, 0, 0), z_dir=(0, -1, 0))):
        with Locations(Location((39.1, 19.91, 0), (0, 0, 270))):
            Circle(MIRROR10_COPY_4_SKETCH_R)
    extrude(amount=-MIRROR10_COPY_4_DEPTH, mode=Mode.SUBTRACT)

    # Mirror10 copy 5 sketch → Mirror10 copy 5 (add)
    with BuildSketch(Plane(origin=(0, 319.1, 10.9), x_dir=(-1, 0, 0), z_dir=(0, 0, -1))):
        with Locations((34.691766758, -188.4)):
            Rectangle(MIRROR10_COPY_5_SKETCH_W, MIRROR10_COPY_5_SKETCH_H)
    extrude(amount=MIRROR10_COPY_5_DEPTH)

    # Mirror10 copy 6 sketch → Mirror10 copy 6 (cut)
    with BuildSketch(Plane(origin=(0, 128.7, -10.7), x_dir=(-1, 0, 0), z_dir=(0, -1, 0))):
        with Locations((39.1, -19.91)):
            Circle(MIRROR10_COPY_6_SKETCH_R)
    extrude(amount=-MIRROR10_COPY_6_DEPTH, mode=Mode.SUBTRACT)

    # Sketch14 → Cut-Extrude8 (cut)
    with BuildSketch(Plane(origin=(0, 250, 0), x_dir=(1, 0, 0), z_dir=(0, 1, 0)).offset(CUT_EXTRUDE8_START)):
        with Locations(Location((0, 0, 0), (0, 0, 270))):
            Circle(SKETCH14_R)
    extrude(amount=CUT_EXTRUDE8_DEPTH, mode=Mode.SUBTRACT)

    # Sketch15 → Cut-Extrude9 (cut, through all)
    with BuildSketch(Plane(origin=(45.1, 0, 0), x_dir=(0, 0, -1), z_dir=(1, 0, 0))):
        with Locations((0, 230.012907866)):
            Rectangle(SKETCH15_W, SKETCH15_H)
    extrude(amount=-CUT_EXTRUDE9_DEPTH, mode=Mode.SUBTRACT)

    # Sketch16 → Cut-Extrude10 (cut, through all)
    with BuildSketch(Plane(origin=(45.1, 0, 0), x_dir=(0, 0, -1), z_dir=(1, 0, 0))):
        with Locations((0, 10)):
            Rectangle(SKETCH16_W, SKETCH16_H)
    extrude(amount=-CUT_EXTRUDE10_DEPTH, mode=Mode.SUBTRACT)

    # Sketch19 → Cut-Extrude11 (cut, through all)
    with BuildSketch(Plane.ZY.offset(45.1)):
        with Locations((-25.1, 50)):
            Circle(SKETCH19_R)
        with Locations((25.1, 50)):
            Circle(SKETCH19_R)
    cut_extrude11 = extrude(amount=-CUT_EXTRUDE11_DEPTH, mode=Mode.SUBTRACT)

    # CirPattern1: Cut-Extrude11 ×2 about axis
    cirpattern1_axis = Axis((0, 210.025815732, 0), (0, -1, 0))
    for i in range(1, CIRPATTERN1_COUNT):
        add(cut_extrude11.rotate(cirpattern1_axis, i * CIRPATTERN1_ANGLE / (CIRPATTERN1_COUNT - 1)), mode=Mode.SUBTRACT)


solid = part.part
